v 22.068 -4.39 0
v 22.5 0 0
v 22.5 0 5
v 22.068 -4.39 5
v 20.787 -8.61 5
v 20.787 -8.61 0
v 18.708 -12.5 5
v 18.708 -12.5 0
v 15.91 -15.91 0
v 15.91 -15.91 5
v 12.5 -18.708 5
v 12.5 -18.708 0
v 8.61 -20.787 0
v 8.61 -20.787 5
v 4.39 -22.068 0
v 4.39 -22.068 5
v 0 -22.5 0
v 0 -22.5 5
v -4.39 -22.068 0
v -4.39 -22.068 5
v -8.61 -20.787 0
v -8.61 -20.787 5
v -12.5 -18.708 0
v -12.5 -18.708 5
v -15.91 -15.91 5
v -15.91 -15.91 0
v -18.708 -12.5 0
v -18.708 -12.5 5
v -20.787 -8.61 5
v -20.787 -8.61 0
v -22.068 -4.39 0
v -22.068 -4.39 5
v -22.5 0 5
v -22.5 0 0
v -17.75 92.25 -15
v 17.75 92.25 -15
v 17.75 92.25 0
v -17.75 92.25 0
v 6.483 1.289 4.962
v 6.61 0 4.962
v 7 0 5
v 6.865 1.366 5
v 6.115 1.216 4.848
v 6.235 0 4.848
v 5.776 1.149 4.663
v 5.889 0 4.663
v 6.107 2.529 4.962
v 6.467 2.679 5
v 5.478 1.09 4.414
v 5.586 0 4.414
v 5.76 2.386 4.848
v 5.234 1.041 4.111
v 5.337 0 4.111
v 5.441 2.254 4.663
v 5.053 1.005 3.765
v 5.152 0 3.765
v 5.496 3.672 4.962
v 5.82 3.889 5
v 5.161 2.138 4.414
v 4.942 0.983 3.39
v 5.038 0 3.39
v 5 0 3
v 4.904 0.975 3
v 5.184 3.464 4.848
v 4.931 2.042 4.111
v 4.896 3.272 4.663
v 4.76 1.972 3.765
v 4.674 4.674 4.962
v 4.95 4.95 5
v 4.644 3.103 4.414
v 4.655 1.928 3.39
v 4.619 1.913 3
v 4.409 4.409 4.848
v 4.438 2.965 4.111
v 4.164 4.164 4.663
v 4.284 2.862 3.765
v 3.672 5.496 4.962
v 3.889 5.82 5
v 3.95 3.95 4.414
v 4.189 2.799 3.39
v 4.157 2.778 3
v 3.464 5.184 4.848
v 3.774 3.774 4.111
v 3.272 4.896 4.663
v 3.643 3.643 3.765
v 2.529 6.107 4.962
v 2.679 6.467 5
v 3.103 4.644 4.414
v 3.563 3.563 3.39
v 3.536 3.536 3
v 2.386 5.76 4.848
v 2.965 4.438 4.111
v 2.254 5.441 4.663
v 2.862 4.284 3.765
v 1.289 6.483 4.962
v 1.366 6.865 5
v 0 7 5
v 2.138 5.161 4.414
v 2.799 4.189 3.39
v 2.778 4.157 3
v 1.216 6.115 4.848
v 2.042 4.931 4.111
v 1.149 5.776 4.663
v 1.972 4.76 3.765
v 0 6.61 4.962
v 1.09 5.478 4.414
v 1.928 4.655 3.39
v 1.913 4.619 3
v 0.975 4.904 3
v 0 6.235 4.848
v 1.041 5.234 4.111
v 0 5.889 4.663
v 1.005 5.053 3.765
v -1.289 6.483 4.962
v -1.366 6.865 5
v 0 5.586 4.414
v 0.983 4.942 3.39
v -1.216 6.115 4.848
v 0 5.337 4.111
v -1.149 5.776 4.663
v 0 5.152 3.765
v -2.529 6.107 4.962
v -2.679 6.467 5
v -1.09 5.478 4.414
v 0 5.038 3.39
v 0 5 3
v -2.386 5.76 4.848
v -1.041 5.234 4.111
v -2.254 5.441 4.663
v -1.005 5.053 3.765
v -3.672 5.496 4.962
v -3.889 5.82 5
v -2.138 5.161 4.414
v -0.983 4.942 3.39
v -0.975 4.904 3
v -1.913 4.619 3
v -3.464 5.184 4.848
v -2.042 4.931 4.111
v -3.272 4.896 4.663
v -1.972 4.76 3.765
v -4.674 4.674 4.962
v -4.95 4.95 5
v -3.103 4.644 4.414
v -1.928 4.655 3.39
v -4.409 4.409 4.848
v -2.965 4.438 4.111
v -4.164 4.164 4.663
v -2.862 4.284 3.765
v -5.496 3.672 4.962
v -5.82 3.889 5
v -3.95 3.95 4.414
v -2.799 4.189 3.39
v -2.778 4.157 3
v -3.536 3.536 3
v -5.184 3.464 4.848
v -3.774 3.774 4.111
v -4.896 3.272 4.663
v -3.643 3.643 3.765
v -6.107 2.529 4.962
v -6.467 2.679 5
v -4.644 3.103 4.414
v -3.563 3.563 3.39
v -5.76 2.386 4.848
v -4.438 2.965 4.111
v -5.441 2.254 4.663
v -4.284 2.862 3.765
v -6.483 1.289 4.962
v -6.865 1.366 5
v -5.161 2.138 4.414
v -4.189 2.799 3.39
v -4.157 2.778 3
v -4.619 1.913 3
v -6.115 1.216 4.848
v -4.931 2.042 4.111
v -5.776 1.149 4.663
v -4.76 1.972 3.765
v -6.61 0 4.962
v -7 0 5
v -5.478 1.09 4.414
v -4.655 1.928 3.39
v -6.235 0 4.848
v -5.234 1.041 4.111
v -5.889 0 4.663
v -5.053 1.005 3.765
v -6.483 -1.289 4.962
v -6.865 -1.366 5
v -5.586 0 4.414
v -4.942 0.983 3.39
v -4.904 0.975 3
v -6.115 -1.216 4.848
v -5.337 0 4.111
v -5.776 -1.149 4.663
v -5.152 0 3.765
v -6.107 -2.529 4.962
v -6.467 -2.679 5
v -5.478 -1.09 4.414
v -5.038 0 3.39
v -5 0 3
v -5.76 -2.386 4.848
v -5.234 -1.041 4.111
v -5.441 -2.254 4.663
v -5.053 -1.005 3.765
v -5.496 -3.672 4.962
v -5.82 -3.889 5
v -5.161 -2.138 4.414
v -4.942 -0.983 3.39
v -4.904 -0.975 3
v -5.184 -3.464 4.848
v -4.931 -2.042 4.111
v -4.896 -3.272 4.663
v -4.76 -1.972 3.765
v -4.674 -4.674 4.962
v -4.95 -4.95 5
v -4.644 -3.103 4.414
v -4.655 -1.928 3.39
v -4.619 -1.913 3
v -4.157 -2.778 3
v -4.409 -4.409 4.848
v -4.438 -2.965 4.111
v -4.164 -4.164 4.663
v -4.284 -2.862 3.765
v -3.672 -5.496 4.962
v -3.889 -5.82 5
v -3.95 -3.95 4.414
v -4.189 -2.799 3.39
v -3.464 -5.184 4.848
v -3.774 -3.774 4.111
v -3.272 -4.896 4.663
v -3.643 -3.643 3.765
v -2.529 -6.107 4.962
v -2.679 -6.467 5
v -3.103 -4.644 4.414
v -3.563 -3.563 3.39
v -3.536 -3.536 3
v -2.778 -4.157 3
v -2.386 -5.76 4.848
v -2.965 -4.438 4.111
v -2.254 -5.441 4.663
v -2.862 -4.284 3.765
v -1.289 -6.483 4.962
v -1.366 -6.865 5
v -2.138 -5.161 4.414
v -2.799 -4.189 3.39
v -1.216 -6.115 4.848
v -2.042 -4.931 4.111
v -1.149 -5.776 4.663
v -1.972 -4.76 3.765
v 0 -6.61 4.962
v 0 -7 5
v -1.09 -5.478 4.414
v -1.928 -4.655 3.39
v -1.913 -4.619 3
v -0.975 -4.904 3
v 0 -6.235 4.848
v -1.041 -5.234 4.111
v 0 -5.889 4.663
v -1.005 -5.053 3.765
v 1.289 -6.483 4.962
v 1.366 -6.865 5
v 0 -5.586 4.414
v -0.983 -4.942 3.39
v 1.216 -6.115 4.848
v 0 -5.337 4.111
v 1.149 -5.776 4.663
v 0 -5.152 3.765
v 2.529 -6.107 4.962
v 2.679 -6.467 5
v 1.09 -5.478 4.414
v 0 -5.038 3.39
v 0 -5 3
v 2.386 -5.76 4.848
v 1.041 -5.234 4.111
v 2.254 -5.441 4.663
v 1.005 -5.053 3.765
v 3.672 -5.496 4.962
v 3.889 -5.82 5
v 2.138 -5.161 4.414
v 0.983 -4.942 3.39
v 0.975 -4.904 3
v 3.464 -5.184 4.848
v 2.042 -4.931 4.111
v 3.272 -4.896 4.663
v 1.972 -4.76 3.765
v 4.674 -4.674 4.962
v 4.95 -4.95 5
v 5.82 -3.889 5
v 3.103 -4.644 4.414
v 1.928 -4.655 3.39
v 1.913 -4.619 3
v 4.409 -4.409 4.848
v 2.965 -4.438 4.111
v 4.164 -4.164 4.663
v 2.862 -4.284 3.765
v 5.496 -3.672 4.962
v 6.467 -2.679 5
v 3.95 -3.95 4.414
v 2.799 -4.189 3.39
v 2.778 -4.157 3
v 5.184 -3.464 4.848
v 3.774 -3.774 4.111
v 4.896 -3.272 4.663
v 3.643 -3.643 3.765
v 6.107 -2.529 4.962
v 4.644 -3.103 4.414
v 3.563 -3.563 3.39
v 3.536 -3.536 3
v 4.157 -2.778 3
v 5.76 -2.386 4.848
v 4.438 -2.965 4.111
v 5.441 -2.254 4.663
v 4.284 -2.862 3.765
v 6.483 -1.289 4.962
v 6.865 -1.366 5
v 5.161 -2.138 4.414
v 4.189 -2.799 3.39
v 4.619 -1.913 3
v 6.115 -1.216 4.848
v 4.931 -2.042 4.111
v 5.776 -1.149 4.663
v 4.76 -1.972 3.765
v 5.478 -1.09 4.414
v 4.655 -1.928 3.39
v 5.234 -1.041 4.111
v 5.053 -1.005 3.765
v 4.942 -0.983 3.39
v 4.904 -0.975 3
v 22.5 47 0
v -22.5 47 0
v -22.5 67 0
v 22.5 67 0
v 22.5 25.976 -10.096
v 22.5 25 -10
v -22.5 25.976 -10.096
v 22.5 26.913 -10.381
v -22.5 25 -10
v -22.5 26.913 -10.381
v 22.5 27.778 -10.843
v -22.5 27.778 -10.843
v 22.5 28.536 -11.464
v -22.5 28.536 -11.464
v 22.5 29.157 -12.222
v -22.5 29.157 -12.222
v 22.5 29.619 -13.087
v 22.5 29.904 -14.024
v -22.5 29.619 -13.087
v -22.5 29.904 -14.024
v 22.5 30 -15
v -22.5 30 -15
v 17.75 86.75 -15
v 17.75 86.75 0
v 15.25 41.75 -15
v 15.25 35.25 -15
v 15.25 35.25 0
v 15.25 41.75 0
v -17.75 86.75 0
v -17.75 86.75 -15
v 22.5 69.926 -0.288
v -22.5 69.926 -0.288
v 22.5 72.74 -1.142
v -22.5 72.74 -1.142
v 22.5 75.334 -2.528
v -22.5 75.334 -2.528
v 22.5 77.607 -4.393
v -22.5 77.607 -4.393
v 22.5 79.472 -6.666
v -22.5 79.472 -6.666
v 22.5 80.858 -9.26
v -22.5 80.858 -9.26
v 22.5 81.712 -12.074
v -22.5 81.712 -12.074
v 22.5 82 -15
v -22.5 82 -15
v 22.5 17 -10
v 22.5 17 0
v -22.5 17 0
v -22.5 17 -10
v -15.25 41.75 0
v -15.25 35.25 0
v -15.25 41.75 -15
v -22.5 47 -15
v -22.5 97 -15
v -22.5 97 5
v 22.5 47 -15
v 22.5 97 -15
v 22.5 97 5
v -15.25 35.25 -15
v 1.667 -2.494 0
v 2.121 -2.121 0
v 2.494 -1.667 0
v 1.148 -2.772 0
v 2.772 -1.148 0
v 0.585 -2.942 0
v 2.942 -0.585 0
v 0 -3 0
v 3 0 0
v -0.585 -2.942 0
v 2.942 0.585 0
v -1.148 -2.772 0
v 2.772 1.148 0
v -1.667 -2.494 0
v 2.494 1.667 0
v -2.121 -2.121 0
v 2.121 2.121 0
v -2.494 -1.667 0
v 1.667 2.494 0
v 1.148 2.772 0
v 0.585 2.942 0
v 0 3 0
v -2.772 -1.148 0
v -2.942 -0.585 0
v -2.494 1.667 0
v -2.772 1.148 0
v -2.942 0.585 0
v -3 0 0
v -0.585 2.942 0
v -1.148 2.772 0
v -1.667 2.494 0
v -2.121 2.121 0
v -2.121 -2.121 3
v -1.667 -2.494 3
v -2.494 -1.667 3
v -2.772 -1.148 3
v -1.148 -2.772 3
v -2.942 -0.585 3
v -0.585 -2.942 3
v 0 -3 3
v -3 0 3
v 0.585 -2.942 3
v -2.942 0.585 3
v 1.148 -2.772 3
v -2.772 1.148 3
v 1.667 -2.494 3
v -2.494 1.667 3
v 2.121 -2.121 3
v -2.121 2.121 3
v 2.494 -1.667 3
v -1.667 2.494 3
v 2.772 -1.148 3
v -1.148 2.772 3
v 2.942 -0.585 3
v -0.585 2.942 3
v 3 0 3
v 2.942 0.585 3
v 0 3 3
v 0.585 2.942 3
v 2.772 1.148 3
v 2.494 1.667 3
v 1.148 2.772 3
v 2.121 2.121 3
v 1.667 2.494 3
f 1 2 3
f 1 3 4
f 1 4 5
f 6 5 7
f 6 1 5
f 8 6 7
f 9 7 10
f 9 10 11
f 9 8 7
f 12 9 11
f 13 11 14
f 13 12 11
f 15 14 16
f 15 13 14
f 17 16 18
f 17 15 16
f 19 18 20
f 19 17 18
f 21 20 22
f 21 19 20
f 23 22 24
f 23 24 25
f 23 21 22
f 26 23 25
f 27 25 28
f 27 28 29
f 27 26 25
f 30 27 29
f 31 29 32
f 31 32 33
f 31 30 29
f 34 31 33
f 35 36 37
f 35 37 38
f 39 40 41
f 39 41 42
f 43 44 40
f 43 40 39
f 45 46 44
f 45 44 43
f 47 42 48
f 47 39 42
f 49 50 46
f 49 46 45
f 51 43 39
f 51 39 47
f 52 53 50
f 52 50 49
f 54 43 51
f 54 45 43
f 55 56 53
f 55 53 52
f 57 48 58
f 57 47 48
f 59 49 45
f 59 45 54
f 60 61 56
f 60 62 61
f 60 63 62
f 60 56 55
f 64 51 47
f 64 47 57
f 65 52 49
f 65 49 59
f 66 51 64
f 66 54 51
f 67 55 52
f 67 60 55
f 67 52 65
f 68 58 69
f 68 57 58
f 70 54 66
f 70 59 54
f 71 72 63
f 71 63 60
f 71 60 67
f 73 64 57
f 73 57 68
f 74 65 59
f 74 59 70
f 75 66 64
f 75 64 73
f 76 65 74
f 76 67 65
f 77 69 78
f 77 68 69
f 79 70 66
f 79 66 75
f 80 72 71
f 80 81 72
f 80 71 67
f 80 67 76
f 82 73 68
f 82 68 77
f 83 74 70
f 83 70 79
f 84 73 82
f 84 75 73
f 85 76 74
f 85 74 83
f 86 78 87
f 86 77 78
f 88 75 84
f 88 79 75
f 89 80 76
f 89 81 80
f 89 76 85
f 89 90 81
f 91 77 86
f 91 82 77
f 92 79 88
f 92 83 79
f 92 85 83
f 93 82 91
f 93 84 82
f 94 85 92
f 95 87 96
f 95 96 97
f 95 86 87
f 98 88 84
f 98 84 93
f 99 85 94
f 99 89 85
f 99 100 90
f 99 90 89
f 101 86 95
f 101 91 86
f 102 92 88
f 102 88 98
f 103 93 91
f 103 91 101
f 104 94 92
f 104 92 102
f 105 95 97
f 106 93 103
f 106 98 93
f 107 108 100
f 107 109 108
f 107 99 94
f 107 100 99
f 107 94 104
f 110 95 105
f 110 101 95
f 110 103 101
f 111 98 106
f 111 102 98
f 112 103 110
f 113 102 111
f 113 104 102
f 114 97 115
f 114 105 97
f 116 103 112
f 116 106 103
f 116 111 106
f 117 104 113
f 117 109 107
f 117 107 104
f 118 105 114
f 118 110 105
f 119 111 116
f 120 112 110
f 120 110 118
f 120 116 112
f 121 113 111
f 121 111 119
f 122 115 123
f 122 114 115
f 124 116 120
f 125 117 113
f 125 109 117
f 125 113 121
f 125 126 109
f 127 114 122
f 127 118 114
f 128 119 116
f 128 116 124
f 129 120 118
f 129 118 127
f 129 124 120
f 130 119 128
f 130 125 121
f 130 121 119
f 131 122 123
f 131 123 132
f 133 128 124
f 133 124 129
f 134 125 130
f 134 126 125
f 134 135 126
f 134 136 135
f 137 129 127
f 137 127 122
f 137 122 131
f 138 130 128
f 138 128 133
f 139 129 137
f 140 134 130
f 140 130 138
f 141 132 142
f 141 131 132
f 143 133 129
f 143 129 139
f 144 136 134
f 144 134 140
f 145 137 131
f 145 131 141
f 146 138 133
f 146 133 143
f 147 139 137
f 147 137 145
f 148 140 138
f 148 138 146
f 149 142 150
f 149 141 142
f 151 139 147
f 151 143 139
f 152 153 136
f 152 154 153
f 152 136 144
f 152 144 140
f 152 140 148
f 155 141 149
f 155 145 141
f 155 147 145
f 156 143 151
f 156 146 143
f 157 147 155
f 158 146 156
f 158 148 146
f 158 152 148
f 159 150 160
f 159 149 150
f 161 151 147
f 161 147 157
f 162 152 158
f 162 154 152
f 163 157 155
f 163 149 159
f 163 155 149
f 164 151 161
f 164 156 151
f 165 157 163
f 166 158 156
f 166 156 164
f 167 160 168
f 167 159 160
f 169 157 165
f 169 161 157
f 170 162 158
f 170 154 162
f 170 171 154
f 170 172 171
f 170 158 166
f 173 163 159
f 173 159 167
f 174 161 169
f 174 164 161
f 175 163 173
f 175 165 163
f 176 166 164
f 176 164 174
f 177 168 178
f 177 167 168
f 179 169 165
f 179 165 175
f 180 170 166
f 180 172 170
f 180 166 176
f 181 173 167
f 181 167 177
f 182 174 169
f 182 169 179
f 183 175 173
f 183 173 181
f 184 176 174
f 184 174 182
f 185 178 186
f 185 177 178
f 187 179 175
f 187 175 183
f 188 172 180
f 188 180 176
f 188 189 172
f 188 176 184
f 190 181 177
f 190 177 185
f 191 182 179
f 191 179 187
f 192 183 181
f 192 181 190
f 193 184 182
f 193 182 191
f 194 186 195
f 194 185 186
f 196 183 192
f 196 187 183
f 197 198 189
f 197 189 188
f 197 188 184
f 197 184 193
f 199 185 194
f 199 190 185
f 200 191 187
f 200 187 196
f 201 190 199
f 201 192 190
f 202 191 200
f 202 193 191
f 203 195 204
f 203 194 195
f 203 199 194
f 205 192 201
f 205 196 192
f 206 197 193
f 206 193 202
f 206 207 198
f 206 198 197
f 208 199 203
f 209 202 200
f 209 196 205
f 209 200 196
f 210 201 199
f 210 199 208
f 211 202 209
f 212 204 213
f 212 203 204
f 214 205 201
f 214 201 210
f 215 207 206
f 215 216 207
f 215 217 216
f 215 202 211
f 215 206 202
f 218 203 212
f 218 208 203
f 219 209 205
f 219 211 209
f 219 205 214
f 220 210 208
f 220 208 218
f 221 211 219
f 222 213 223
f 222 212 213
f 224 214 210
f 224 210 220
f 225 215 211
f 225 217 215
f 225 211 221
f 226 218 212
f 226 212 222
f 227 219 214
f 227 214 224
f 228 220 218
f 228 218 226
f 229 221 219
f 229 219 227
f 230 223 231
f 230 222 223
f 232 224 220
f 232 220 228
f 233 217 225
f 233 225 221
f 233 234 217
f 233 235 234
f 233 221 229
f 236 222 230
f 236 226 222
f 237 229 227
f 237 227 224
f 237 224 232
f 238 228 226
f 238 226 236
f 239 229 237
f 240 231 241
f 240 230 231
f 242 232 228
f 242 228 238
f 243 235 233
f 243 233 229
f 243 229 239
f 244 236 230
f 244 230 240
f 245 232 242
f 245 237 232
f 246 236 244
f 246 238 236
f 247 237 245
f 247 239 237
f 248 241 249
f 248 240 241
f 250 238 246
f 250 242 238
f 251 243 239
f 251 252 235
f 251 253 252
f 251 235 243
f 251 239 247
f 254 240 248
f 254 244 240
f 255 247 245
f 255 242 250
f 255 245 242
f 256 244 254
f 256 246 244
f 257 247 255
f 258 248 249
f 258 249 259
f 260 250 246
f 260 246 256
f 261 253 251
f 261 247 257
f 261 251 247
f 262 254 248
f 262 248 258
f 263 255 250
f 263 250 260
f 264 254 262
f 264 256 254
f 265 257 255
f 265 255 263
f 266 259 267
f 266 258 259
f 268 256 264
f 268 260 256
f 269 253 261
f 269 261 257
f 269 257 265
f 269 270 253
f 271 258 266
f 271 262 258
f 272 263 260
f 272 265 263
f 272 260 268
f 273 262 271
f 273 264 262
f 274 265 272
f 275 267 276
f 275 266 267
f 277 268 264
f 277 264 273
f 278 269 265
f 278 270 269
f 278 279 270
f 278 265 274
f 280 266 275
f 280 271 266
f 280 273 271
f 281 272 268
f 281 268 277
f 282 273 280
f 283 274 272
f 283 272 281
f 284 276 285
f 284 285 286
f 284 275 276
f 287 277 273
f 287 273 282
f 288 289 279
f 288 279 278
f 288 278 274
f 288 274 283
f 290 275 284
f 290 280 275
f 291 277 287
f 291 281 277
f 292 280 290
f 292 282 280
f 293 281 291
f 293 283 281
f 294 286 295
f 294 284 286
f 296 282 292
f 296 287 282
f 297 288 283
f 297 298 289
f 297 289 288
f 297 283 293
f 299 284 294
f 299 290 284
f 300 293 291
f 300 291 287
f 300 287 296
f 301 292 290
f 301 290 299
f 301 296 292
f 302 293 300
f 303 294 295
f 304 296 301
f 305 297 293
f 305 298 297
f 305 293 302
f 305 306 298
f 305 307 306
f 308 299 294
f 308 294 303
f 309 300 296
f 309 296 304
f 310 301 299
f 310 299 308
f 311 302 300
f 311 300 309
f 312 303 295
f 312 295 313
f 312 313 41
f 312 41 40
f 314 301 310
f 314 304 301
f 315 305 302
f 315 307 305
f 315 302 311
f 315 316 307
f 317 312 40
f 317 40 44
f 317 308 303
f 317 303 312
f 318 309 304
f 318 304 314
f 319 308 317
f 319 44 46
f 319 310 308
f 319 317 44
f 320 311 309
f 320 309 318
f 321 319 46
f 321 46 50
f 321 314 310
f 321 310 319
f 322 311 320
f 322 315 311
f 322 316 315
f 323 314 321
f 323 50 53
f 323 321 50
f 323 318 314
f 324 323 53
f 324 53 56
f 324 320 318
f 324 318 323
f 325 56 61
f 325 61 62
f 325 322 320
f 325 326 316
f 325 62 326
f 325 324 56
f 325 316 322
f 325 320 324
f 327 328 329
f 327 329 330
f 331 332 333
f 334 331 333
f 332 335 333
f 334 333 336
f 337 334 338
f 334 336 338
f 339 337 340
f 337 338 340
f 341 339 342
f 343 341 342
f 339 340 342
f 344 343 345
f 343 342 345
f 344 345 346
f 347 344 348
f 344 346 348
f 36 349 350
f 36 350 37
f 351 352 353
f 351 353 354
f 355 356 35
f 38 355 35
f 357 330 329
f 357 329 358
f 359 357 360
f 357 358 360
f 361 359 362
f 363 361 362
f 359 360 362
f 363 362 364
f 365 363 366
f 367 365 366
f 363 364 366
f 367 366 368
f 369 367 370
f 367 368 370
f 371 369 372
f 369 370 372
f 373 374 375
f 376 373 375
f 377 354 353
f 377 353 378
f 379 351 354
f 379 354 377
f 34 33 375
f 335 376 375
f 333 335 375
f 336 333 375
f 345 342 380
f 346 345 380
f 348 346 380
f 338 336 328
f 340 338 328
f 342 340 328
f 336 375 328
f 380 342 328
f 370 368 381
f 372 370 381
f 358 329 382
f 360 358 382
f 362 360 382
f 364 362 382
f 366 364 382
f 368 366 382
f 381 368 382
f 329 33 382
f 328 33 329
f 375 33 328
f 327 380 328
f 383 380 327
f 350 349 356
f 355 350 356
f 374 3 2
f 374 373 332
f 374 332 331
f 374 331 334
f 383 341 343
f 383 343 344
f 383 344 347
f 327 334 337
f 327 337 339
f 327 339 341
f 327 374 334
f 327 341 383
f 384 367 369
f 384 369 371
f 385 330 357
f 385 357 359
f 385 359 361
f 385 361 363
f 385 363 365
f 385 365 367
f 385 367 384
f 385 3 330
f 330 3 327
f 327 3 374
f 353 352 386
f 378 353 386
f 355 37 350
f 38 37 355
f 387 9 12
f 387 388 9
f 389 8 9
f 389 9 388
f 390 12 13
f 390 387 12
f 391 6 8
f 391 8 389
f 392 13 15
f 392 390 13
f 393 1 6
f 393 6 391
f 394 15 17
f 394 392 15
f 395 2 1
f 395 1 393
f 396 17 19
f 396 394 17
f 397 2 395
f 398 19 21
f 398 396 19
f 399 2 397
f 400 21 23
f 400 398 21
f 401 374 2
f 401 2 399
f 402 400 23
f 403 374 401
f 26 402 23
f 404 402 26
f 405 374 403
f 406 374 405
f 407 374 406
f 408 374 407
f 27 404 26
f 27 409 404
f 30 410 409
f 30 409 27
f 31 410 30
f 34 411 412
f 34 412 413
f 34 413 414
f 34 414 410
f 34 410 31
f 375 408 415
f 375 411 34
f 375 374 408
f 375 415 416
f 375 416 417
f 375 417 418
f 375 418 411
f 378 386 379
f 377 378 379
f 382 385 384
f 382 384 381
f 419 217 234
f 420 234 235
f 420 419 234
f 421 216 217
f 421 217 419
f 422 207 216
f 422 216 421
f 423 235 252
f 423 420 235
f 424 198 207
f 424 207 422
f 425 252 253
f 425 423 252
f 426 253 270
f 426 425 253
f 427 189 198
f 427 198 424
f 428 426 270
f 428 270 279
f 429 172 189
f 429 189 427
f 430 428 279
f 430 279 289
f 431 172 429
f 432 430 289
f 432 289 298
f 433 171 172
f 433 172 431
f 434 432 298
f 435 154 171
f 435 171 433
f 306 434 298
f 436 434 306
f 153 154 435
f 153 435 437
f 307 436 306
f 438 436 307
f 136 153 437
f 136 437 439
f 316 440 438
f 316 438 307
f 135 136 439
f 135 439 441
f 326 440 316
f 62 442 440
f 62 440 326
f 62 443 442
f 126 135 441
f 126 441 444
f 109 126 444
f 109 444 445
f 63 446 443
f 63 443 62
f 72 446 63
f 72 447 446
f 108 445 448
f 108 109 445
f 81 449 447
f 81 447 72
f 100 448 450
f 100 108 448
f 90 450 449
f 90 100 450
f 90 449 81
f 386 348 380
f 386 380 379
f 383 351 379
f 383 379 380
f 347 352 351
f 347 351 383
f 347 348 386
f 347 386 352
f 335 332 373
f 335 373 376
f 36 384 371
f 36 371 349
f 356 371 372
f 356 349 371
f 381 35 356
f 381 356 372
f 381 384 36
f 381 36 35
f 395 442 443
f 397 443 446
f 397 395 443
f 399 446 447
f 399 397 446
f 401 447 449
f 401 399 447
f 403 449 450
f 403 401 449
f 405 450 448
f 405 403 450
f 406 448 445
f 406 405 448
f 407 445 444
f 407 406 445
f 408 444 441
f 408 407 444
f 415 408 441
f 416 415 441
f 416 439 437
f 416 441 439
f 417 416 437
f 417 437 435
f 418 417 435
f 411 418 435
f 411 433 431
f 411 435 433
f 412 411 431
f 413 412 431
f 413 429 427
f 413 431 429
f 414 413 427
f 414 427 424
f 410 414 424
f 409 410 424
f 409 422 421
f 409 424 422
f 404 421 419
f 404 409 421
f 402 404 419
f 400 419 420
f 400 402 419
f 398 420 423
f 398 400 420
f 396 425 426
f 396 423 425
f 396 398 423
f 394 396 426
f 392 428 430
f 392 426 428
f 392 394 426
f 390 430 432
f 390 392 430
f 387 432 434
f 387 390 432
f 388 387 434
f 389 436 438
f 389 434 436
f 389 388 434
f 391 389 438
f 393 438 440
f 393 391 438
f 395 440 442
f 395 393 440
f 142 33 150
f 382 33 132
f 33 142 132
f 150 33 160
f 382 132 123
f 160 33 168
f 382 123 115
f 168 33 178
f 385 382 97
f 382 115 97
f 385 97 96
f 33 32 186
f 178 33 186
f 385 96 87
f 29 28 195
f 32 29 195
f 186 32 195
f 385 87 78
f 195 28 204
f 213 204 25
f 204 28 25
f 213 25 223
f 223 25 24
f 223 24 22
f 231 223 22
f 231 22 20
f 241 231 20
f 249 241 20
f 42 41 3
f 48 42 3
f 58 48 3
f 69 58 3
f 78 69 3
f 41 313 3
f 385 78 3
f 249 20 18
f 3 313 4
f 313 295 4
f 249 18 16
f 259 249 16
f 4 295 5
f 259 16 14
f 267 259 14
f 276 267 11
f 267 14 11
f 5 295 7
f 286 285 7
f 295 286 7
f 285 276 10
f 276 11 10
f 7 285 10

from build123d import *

# Parameters (mm, degrees)
ESBO_O2_R                = 3
RESSALTO_EXTRUS_O1_DEPTH = 5
ESBO_O11_R               = 5
CORTE_EXTRUS_O3_DEPTH    = 2
ESBO_O3_W                = 45
ESBO_O3_H                = 13
RESSALTO_EXTRUS_O2_DEPTH = 10
ESBO_O4_W                = 45
ESBO_O4_H                = 20
RESSALTO_EXTRUS_O3_DEPTH = 17
ESBO_O6_W                = 30.5
ESBO_O6_H                = 6.5
CORTE_EXTRUS_O1_DEPTH    = 15
ESBO_O7_W                = 45
ESBO_O7_H                = 5
RESSALTO_EXTRUS_O4_DEPTH = 50
ESBO_O8_W                = 45
ESBO_O8_H                = 15
RESSALTO_EXTRUS_O5_DEPTH = 15
ESBO_O9_W                = 35.5
ESBO_O9_H                = 5.5
CORTE_EXTRUS_O2_DEPTH    = 15
FILETE4_R                = 5
FILETE6_R                = 15
FILETE7_R                = 2


with BuildPart() as part:
    # Esboço2 → Ressalto-extrusão1 (new body)
    with BuildSketch(Plane.XY):
        with BuildLine():
            Line((-22.5, 0), (-22.5, 30))
            Line((-22.5, 30), (22.5, 30))
            Line((22.5, 30), (22.5, 0))
            ThreePointArc((22.5, 0), (0, -22.5), (-22.5, 0))
        make_face()
        Circle(ESBO_O2_R, mode=Mode.SUBTRACT)
    extrude(amount=RESSALTO_EXTRUS_O1_DEPTH)

    # Esboço11 → Corte-extrusão3 (cut)
    with BuildSketch(Plane.XY.offset(5)):
        Circle(ESBO_O11_R)
    extrude(amount=-CORTE_EXTRUS_O3_DEPTH, mode=Mode.SUBTRACT)

    # Esboço3 → Ressalto-extrusão2 (add)
    with BuildSketch(Plane(origin=(0, 0, 0), x_dir=(-1, 0, 0), z_dir=(0, 0, -1))):
        with Locations((0, 23.5)):
            Rectangle(ESBO_O3_W, ESBO_O3_H)
    extrude(amount=RESSALTO_EXTRUS_O2_DEPTH)

    # Esboço4 → Ressalto-extrusão3 (add)
    with BuildSketch(Plane(origin=(0, 30, 0), x_dir=(1, 0, 0), z_dir=(0, 1, 0))):
        with Locations((0, 5)):
            Rectangle(ESBO_O4_W, ESBO_O4_H)
    extrude(amount=RESSALTO_EXTRUS_O3_DEPTH)

    # Esboço6 → Corte-extrusão1 (cut)
    with BuildSketch(Plane(origin=(0, 0, -15), x_dir=(-1, 0, 0), z_dir=(0, 0, -1))):
        with Locations((0, 38.5)):
            Rectangle(ESBO_O6_W, ESBO_O6_H)
    extrude(amount=-CORTE_EXTRUS_O1_DEPTH, mode=Mode.SUBTRACT)

    # Esboço7 → Ressalto-extrusão4 (add)
    with BuildSketch(Plane(origin=(0, 47, 0), x_dir=(1, 0, 0), z_dir=(0, 1, 0))):
        with Locations((0, -2.5)):
            Rectangle(ESBO_O7_W, ESBO_O7_H)
    extrude(amount=RESSALTO_EXTRUS_O4_DEPTH)

    # Esboço8 → Ressalto-extrusão5 (add)
    with BuildSketch(Plane(origin=(0, 0, 0), x_dir=(-1, 0, 0), z_dir=(0, 0, -1))):
        with Locations((0, 89.5)):
            Rectangle(ESBO_O8_W, ESBO_O8_H)
    extrude(amount=RESSALTO_EXTRUS_O5_DEPTH)

    # Esboço9 → Corte-extrusão2 (cut)
    with BuildSketch(Plane(origin=(0, 0, -15), x_dir=(-1, 0, 0), z_dir=(0, 0, -1))):
        with Locations((0, 89.5)):
            Rectangle(ESBO_O9_W, ESBO_O9_H)
    extrude(amount=-CORTE_EXTRUS_O2_DEPTH, mode=Mode.SUBTRACT)

    # Filete4
    filete4_edges = [part.edges().sort_by_distance(p)[0] for p in [
        (0, 30, -10),
    ]]
    fillet(filete4_edges, radius=FILETE4_R - 0.0001)  # a hair under: the kernel refuses the full size

    # Filete6
    filete6_edges = [part.edges().sort_by_distance(p)[0] for p in [
        (0, 82, 0),
    ]]
    fillet(filete6_edges, radius=FILETE6_R - 0.0001)  # a hair under: the kernel refuses the full size

    # Filete7
    filete7_edges = [part.edges().sort_by_distance(p)[0] for p in [
        (-5, 0, 5),
    ]]
    fillet(filete7_edges, radius=FILETE7_R - 0.0001)  # a hair under: the kernel refuses the full size


solid = part.part
